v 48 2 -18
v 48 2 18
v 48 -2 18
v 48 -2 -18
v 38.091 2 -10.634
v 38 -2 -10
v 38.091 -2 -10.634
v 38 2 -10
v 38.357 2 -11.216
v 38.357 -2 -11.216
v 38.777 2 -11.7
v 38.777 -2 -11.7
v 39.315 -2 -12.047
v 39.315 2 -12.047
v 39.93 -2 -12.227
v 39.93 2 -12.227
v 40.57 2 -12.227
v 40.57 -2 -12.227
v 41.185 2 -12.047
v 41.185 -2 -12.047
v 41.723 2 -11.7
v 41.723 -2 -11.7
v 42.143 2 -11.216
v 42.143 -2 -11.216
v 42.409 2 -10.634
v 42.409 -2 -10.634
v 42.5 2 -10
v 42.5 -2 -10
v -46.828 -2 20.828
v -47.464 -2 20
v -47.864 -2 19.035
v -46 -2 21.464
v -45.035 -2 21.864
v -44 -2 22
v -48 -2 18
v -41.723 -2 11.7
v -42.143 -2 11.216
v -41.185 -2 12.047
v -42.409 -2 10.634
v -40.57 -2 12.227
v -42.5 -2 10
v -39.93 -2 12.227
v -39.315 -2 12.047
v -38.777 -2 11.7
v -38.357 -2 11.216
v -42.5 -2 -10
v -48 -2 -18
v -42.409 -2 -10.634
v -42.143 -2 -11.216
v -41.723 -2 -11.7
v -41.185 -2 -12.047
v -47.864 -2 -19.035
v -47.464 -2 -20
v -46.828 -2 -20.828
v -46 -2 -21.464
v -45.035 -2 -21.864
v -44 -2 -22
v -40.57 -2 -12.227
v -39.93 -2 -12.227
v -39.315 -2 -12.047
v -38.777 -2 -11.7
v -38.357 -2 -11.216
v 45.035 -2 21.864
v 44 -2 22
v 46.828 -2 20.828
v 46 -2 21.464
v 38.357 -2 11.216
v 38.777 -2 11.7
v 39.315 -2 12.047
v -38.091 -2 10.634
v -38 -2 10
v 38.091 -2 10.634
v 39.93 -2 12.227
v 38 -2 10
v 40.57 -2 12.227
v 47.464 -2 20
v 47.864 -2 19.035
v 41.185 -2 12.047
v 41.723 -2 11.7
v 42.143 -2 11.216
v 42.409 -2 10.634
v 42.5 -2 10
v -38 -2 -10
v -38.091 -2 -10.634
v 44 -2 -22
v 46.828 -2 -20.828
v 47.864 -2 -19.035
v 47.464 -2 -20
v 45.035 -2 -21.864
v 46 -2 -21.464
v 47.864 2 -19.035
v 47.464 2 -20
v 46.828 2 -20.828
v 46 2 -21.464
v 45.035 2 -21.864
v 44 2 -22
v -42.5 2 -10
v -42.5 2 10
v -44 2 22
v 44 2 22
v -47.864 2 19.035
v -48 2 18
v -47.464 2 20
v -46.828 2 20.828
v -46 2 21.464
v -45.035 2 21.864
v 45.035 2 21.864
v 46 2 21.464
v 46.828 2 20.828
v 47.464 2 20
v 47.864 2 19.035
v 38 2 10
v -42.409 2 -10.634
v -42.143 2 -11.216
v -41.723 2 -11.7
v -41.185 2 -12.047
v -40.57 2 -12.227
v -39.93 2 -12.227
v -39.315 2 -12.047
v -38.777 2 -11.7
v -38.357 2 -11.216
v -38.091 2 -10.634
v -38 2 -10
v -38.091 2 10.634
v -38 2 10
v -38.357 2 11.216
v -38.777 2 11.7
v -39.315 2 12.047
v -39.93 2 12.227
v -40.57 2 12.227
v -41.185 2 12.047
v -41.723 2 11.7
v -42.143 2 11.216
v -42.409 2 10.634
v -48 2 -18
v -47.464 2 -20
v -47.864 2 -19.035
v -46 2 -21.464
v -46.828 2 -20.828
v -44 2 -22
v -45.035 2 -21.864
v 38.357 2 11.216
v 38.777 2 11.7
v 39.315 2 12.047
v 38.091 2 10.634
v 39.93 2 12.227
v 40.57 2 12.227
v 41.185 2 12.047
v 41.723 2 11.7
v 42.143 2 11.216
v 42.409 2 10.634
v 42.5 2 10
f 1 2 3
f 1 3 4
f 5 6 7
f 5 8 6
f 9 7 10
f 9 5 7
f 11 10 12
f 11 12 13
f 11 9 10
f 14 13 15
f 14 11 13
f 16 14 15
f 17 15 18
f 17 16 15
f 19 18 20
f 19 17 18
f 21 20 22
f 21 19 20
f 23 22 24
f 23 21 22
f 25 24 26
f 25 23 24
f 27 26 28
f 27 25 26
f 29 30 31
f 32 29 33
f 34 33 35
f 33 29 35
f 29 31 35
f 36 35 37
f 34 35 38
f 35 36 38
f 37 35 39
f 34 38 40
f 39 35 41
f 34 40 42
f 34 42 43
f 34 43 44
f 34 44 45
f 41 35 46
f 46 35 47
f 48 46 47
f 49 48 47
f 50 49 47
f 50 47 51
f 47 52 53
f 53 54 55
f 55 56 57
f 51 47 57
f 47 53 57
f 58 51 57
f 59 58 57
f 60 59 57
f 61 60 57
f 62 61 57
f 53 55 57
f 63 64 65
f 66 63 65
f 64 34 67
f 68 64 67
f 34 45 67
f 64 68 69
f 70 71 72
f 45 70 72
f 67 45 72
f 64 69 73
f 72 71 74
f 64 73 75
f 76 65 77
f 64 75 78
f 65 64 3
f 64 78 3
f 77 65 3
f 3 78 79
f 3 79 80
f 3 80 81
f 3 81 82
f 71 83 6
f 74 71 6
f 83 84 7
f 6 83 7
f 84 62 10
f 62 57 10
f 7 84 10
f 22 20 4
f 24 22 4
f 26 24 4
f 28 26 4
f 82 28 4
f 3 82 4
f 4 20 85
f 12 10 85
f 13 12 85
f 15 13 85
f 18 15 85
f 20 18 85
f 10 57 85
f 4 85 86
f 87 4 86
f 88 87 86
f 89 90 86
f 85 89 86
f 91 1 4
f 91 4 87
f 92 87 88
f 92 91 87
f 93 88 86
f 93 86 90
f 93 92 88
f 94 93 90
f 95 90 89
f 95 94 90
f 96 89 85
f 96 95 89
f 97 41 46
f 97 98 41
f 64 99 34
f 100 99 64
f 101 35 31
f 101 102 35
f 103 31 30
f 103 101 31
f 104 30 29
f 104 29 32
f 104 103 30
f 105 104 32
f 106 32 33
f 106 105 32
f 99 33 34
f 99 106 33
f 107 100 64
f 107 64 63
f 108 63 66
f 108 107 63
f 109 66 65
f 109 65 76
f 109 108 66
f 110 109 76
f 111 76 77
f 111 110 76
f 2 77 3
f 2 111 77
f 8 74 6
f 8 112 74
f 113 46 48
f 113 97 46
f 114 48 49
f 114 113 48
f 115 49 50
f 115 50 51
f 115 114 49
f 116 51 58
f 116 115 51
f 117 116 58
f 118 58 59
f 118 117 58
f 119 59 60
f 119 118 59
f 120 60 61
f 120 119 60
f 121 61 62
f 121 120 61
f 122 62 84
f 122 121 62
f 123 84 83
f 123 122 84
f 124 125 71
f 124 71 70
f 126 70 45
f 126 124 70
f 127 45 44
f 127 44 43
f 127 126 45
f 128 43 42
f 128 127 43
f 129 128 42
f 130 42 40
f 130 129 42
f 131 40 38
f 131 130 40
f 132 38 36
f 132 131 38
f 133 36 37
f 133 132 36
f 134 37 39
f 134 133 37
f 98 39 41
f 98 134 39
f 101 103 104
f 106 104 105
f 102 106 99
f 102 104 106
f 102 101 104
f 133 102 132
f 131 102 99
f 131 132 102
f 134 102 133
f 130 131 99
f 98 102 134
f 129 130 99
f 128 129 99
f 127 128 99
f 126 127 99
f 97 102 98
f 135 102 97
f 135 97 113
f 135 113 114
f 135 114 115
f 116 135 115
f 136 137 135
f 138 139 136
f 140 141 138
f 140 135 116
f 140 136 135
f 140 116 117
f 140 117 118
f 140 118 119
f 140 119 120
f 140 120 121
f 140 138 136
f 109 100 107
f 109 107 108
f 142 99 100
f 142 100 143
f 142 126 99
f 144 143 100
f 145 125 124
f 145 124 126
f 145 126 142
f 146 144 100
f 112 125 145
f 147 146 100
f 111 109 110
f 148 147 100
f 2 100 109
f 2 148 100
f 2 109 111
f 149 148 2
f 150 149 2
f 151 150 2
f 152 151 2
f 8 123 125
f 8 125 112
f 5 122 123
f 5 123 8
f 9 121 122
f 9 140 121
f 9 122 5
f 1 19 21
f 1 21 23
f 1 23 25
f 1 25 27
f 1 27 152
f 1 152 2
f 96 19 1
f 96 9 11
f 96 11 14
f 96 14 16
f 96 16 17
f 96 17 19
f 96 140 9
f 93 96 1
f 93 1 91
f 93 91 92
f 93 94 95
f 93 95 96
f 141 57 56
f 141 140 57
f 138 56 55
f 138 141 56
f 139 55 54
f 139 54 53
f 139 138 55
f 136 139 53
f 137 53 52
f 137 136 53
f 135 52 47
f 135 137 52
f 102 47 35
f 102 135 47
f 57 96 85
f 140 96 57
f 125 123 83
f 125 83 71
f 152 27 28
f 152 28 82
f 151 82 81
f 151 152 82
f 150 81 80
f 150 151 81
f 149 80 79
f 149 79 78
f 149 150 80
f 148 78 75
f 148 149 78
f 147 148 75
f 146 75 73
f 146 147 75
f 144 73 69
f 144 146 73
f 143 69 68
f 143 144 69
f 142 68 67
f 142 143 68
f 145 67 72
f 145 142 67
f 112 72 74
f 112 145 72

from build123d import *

# Parameters (mm, degrees)
BOSS_EXTRUDE1_DEPTH = 2


with BuildPart() as part:
    # Sketch1 → Boss-Extrude1 (new body, symmetric)
    with BuildSketch(Plane(origin=(0, 0, 0), x_dir=(1, 0, 0), z_dir=(0, 1, 0))):
        with BuildLine():
            Line((-44, -22), (44, -22))
            ThreePointArc((44, -22), (46.828427125, -20.828427125), (48, -18))
            Line((48, -18), (48, 18))
            ThreePointArc((48, 18), (46.828427125, 20.828427125), (44, 22))
            Line((44, 22), (-44, 22))
            ThreePointArc((-44, 22), (-46.828427125, 20.828427125), (-48, 18))
            Line((-48, 18), (-48, -18))
            ThreePointArc((-48, -18), (-46.828427125, -20.828427125), (-44, -22))
        make_face()
        with BuildLine():
            Line((-38, 10), (-38, -10))
            ThreePointArc((-38, -10), (-40.25, -12.25), (-42.5, -10))
            Line((-42.5, -10), (-42.5, 10))
            ThreePointArc((-42.5, 10), (-40.25, 12.25), (-38, 10))
        make_face(mode=Mode.SUBTRACT)
        with BuildLine():
            Line((42.5, 10), (42.5, -10))
            ThreePointArc((42.5, -10), (40.25, -12.25), (38, -10))
            Line((38, -10), (38, 10))
            ThreePointArc((38, 10), (40.25, 12.25), (42.5, 10))
        make_face(mode=Mode.SUBTRACT)
    extrude(amount=BOSS_EXTRUDE1_DEPTH, both=True)


solid = part.part
